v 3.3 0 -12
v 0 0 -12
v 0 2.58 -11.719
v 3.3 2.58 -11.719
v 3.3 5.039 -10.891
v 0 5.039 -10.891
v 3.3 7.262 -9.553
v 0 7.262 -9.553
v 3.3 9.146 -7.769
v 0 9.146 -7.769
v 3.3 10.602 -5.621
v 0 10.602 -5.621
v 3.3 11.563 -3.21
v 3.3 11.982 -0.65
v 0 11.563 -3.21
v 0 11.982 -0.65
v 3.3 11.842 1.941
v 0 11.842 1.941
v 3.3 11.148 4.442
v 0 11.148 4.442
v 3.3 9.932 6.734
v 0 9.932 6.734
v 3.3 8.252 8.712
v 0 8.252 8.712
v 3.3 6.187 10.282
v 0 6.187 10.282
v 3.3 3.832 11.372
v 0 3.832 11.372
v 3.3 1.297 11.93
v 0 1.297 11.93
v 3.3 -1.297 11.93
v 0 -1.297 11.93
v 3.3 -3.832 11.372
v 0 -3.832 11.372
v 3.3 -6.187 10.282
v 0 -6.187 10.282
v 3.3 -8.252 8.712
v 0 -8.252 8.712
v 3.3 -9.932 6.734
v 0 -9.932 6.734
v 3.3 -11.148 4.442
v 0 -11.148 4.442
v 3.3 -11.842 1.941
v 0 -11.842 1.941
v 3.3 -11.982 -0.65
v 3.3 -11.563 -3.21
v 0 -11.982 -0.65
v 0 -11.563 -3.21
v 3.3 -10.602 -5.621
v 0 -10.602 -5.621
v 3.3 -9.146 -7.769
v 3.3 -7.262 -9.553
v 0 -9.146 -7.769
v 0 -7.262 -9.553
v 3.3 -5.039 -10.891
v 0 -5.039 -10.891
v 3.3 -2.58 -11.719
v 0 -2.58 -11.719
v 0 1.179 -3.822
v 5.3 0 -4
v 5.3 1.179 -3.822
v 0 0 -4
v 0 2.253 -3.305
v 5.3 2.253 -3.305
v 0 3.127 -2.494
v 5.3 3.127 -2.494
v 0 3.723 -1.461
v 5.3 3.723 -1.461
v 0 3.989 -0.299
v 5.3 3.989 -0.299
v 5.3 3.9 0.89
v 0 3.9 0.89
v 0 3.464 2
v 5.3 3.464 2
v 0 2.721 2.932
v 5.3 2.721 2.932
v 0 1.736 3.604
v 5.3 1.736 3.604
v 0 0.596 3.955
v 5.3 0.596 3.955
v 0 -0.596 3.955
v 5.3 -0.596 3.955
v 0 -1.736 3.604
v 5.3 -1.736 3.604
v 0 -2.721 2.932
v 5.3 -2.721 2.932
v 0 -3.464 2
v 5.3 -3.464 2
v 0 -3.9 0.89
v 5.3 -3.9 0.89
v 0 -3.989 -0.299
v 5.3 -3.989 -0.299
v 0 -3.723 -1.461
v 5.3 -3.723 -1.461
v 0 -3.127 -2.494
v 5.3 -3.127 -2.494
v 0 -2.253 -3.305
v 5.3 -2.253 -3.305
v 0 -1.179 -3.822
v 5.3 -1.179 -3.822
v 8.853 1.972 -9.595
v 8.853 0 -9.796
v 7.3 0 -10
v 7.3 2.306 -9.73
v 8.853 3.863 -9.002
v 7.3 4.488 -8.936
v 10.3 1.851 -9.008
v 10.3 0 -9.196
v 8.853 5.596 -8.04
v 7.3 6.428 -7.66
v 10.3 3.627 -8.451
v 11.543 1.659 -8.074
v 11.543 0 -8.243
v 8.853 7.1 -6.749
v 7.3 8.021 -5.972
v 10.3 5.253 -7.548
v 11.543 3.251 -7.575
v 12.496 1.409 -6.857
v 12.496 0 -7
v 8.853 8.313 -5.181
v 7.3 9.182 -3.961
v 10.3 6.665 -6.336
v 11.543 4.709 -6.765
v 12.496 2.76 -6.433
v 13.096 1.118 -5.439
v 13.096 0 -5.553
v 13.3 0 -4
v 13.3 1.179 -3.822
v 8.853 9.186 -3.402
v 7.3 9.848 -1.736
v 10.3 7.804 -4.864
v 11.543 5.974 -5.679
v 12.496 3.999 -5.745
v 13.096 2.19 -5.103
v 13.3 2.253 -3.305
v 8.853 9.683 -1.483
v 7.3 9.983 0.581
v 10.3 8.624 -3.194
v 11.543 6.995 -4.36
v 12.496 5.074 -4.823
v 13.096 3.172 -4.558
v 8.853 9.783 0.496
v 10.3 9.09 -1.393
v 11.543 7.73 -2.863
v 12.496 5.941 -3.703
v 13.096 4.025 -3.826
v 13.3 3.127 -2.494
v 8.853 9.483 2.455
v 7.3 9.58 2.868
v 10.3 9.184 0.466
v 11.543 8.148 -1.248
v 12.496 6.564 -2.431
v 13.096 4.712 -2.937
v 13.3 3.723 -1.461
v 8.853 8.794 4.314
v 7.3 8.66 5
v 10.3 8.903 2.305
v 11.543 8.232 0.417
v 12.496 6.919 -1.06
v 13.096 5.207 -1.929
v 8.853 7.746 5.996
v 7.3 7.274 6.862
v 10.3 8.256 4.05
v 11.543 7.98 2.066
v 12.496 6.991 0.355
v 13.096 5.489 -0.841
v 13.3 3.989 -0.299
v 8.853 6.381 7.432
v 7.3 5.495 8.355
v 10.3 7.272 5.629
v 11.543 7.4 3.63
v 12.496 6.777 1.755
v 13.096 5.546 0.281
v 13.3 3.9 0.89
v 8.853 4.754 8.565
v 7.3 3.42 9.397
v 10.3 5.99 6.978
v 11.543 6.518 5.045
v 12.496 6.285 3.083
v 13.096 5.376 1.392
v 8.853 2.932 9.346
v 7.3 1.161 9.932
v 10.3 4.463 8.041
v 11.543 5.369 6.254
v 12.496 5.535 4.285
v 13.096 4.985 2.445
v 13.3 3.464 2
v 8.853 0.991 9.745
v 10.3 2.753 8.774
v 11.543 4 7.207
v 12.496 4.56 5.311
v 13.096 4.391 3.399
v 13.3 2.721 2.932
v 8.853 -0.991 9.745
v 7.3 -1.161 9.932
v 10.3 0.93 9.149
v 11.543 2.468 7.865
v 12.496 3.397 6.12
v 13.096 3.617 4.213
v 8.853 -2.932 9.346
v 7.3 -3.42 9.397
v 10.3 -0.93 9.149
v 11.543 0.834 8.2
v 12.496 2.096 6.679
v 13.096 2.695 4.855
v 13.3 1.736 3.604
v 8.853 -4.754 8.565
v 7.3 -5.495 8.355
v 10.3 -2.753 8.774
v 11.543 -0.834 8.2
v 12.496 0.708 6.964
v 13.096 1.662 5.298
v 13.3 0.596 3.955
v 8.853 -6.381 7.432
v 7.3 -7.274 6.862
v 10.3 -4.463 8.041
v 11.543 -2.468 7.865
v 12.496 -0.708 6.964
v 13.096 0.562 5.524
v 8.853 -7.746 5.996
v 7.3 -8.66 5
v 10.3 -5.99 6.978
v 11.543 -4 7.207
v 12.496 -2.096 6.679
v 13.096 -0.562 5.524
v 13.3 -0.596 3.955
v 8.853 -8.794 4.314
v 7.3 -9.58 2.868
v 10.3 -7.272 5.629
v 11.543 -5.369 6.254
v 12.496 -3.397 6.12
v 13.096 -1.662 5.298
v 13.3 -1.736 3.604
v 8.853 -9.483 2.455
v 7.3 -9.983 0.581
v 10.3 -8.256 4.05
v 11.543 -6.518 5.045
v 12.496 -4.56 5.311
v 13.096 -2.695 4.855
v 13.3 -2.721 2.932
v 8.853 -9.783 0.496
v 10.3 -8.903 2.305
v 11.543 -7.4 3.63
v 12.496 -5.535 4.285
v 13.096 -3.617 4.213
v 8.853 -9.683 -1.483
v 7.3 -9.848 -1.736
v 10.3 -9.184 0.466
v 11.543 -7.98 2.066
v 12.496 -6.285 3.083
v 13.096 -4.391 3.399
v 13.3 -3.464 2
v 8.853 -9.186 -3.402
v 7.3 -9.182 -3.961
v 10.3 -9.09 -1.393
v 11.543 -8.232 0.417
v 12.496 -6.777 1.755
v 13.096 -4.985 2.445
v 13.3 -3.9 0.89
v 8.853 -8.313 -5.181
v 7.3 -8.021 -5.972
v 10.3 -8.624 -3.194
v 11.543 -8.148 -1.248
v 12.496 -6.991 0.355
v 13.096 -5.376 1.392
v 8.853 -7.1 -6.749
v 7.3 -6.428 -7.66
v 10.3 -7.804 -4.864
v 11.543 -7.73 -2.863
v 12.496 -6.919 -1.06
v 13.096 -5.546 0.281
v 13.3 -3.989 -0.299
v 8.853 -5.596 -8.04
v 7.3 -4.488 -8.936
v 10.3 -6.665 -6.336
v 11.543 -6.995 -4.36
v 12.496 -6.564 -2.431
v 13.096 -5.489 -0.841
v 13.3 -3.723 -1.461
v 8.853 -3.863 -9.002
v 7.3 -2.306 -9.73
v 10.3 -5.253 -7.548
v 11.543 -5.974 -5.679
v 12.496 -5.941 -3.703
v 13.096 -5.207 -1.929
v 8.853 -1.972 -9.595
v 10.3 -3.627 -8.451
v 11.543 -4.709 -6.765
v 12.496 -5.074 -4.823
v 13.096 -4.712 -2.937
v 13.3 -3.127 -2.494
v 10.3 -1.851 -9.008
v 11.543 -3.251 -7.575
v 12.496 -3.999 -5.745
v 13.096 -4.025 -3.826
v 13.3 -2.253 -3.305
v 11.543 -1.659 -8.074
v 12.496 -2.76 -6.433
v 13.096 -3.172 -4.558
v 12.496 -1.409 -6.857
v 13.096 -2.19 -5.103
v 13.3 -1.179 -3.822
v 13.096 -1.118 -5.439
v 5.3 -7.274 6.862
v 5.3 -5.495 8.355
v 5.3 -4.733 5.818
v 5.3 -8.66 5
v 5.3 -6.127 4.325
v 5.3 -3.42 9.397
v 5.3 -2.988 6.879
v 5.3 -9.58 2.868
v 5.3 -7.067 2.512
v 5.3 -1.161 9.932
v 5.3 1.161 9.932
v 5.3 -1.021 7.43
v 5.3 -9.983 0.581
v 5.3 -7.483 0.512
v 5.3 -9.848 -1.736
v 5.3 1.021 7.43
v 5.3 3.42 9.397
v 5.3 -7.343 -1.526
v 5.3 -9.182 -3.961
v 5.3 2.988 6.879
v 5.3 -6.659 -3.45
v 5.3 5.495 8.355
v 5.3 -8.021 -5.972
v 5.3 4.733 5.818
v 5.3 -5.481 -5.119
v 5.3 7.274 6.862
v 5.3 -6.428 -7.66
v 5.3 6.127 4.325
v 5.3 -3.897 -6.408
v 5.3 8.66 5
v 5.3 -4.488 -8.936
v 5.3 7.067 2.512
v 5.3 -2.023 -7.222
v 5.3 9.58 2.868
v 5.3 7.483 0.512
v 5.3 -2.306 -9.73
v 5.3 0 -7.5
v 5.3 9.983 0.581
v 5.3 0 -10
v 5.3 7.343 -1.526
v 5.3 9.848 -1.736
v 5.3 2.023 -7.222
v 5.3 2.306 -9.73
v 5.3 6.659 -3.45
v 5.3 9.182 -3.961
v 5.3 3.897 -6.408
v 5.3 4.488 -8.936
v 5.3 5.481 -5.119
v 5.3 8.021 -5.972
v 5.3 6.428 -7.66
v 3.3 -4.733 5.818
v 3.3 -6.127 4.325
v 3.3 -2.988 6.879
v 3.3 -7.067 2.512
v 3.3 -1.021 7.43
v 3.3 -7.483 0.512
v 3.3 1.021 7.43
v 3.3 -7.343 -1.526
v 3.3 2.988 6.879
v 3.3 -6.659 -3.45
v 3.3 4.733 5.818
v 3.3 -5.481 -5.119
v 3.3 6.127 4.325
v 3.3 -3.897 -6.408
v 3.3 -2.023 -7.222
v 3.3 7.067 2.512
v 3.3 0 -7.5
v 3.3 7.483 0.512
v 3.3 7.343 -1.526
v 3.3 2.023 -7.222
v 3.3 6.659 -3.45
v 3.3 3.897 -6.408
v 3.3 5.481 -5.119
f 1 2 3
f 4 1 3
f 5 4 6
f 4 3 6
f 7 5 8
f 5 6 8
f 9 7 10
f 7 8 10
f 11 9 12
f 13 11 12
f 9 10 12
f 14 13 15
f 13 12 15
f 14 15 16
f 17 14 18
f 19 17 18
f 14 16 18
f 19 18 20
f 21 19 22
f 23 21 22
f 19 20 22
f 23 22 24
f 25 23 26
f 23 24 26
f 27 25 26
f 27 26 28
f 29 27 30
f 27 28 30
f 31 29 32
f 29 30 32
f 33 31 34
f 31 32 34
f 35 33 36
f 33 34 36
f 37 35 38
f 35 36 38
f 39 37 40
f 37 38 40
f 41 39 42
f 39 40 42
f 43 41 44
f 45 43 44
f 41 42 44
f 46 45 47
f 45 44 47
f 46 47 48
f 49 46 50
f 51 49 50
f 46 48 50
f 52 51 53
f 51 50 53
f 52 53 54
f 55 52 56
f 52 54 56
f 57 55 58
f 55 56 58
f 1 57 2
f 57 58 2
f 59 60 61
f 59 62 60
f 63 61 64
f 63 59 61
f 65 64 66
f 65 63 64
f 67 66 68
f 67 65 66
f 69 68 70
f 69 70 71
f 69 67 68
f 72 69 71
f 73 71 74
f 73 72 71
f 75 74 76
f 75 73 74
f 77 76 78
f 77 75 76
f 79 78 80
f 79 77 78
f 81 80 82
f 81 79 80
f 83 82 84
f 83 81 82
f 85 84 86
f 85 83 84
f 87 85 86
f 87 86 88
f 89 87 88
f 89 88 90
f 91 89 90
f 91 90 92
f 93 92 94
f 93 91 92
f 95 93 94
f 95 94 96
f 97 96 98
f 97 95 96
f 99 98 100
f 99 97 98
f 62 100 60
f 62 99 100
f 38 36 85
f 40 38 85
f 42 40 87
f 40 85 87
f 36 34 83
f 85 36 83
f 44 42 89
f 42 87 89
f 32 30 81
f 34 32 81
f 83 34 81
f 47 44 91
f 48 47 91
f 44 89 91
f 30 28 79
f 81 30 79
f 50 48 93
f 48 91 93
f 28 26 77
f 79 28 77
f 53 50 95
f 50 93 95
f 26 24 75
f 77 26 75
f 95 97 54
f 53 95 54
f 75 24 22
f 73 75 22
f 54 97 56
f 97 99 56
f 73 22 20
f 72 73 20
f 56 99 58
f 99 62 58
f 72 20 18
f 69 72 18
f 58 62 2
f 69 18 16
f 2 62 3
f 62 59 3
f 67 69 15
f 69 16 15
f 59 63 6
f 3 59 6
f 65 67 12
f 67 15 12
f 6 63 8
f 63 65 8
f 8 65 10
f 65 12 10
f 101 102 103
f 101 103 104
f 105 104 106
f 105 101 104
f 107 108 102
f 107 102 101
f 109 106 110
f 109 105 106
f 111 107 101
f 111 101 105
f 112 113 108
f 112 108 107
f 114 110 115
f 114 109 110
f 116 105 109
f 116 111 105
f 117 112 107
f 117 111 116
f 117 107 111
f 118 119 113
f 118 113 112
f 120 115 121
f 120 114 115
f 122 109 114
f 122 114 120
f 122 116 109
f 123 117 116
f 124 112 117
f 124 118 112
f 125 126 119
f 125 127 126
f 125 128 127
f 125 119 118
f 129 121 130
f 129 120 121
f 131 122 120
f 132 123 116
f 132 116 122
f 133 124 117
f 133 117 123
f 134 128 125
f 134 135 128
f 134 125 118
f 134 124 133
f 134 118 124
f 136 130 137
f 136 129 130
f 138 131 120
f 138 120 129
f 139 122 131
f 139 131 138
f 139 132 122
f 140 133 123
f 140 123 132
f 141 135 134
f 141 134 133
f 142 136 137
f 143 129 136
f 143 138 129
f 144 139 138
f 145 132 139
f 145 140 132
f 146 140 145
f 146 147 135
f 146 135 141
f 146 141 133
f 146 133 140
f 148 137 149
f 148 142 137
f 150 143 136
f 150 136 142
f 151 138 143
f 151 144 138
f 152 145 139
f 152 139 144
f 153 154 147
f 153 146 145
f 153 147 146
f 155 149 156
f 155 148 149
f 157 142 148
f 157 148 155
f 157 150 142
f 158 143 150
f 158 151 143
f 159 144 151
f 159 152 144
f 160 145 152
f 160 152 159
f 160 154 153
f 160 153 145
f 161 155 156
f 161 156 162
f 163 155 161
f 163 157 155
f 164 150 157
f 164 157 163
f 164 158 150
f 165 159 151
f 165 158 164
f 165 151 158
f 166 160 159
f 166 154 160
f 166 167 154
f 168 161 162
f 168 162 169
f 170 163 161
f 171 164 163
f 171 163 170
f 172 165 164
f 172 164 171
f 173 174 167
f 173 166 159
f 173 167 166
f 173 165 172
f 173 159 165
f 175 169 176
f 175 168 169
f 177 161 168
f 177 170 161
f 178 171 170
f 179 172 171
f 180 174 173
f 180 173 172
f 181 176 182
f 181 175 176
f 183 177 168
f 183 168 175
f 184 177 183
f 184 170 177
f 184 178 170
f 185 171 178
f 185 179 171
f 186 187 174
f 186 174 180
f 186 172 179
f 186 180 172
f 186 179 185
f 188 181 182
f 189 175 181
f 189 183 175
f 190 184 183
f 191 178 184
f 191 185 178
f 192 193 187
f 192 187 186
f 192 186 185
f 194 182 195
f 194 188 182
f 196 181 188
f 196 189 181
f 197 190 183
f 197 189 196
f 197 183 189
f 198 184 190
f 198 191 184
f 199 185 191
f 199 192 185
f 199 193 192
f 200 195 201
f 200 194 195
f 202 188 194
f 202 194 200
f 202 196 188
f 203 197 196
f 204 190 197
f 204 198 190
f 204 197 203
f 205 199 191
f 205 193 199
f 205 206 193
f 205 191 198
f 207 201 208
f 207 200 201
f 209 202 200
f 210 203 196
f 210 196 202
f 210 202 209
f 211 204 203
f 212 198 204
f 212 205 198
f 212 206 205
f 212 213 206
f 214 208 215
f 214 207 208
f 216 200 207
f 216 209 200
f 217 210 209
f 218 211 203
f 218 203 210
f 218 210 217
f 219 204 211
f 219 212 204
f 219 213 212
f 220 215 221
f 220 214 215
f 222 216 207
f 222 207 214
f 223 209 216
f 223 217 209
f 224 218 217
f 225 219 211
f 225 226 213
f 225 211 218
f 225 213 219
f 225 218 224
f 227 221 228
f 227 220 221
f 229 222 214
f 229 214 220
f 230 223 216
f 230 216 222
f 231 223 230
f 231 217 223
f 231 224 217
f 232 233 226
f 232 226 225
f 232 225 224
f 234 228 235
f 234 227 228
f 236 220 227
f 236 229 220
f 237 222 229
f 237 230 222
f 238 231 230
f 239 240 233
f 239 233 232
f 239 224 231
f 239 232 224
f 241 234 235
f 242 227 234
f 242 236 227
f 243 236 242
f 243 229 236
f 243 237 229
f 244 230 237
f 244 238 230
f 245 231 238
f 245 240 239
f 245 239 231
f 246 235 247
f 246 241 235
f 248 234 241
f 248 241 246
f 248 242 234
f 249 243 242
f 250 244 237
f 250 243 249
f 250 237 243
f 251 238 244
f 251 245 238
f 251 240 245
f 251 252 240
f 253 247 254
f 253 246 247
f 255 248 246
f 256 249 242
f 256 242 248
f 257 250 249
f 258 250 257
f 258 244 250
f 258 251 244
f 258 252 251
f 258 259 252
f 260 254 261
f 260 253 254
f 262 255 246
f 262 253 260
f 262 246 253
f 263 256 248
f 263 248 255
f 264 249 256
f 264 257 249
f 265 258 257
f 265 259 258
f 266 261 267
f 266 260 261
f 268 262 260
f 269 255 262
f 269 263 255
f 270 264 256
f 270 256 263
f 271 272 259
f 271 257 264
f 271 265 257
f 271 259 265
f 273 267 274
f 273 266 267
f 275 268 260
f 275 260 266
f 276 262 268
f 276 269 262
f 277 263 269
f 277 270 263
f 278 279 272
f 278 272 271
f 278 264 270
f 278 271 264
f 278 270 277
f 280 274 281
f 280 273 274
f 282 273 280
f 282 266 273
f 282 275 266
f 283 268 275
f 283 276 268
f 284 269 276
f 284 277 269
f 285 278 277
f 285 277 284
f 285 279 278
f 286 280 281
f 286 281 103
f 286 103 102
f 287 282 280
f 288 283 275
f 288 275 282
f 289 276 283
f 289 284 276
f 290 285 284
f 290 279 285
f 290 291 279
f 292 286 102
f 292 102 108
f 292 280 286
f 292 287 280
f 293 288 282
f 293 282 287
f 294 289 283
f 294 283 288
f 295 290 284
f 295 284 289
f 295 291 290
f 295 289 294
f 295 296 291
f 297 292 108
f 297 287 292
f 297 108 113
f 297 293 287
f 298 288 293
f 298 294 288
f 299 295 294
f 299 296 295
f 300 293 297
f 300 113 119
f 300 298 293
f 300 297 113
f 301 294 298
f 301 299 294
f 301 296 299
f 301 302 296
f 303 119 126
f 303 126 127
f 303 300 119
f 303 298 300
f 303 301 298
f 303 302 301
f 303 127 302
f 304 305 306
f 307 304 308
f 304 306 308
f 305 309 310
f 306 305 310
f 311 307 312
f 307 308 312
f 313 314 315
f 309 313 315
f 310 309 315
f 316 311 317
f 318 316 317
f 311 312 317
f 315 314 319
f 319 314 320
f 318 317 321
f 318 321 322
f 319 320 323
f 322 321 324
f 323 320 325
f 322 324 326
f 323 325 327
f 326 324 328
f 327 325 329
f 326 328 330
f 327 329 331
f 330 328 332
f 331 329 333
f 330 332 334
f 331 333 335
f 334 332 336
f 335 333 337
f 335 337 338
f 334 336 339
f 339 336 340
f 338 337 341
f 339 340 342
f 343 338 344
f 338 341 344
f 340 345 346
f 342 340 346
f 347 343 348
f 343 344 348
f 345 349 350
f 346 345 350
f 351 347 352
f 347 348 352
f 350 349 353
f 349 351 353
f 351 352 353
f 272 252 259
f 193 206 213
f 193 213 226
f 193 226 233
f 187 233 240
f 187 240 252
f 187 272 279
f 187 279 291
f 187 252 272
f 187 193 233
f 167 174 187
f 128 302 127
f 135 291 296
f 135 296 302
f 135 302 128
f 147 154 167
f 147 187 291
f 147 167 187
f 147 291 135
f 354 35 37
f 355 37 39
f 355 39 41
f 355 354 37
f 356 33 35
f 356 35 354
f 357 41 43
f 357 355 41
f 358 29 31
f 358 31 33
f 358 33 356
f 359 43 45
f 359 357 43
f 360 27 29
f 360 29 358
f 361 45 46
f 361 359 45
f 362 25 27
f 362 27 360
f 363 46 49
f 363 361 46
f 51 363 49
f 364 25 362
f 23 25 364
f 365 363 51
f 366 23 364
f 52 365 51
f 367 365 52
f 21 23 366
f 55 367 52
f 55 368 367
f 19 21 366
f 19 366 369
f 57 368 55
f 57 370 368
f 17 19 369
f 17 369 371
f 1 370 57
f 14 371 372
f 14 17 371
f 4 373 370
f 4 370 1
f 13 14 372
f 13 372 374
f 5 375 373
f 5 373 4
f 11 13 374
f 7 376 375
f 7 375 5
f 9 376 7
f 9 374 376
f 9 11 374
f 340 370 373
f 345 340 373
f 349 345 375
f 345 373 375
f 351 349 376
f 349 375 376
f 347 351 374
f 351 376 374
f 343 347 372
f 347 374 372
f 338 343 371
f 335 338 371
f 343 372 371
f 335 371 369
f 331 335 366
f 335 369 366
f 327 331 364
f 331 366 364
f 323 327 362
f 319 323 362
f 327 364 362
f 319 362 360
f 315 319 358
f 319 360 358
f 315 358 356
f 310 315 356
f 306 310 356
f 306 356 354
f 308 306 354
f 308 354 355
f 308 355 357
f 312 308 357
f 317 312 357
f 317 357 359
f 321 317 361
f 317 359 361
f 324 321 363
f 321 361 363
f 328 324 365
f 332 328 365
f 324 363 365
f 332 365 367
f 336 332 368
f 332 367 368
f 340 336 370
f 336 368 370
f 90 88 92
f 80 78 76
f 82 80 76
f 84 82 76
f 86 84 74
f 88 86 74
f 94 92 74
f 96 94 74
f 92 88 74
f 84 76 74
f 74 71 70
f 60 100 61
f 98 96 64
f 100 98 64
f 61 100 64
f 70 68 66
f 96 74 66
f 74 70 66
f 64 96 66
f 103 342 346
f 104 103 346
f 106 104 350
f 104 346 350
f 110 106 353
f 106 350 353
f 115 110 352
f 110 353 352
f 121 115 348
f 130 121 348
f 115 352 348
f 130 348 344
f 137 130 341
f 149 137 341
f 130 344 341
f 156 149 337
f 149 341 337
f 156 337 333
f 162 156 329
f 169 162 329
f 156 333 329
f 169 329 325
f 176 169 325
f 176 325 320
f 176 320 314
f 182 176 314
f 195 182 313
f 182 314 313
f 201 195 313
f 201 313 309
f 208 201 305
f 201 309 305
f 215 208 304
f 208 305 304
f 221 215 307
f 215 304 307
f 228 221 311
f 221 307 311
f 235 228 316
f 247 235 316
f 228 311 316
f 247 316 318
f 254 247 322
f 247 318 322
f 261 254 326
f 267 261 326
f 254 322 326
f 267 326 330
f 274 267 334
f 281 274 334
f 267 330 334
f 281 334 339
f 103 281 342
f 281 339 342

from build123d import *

# Parameters (mm, degrees)
SKETCH_2_R      = 12
SKETCH_2_R_2    = 4
EXTRUDE_1_DEPTH = 3.3
SKETCH_3_R      = 7.5
SKETCH_3_R_2    = 4
EXTRUDE_2_DEPTH = 2
SKETCH_4_R      = 10
EXTRUDE_3_DEPTH = 8
FILLET_1_R      = 6


with BuildPart() as part:
    # Эскиз2 → Бобышка-Вытянуть1 (new body)
    with BuildSketch(Plane(origin=(0, 0, 0), x_dir=(0, 0, -1), z_dir=(1, 0, 0))):
        Circle(SKETCH_2_R)
        Circle(SKETCH_2_R_2, mode=Mode.SUBTRACT)
    extrude(amount=EXTRUDE_1_DEPTH)

    # Эскиз3 → Бобышка-Вытянуть2 (add)
    with BuildSketch(Plane(origin=(3.3, 0, 0), x_dir=(0, 0, -1), z_dir=(1, 0, 0))):
        Circle(SKETCH_3_R)
        Circle(SKETCH_3_R_2, mode=Mode.SUBTRACT)
    extrude(amount=EXTRUDE_2_DEPTH)

    # Эскиз4 → Бобышка-Вытянуть3 (add)
    with BuildSketch(Plane(origin=(5.3, 0, 0), x_dir=(0, 0, -1), z_dir=(1, 0, 0))):
        Circle(SKETCH_4_R)
    extrude(amount=EXTRUDE_3_DEPTH)

    # Скругление1
    fillet_1_edges = [part.edges().sort_by_distance(p)[0] for p in [
        (13.3, 0, 10),
    ]]
    fillet(fillet_1_edges, radius=FILLET_1_R)


solid = part.part
